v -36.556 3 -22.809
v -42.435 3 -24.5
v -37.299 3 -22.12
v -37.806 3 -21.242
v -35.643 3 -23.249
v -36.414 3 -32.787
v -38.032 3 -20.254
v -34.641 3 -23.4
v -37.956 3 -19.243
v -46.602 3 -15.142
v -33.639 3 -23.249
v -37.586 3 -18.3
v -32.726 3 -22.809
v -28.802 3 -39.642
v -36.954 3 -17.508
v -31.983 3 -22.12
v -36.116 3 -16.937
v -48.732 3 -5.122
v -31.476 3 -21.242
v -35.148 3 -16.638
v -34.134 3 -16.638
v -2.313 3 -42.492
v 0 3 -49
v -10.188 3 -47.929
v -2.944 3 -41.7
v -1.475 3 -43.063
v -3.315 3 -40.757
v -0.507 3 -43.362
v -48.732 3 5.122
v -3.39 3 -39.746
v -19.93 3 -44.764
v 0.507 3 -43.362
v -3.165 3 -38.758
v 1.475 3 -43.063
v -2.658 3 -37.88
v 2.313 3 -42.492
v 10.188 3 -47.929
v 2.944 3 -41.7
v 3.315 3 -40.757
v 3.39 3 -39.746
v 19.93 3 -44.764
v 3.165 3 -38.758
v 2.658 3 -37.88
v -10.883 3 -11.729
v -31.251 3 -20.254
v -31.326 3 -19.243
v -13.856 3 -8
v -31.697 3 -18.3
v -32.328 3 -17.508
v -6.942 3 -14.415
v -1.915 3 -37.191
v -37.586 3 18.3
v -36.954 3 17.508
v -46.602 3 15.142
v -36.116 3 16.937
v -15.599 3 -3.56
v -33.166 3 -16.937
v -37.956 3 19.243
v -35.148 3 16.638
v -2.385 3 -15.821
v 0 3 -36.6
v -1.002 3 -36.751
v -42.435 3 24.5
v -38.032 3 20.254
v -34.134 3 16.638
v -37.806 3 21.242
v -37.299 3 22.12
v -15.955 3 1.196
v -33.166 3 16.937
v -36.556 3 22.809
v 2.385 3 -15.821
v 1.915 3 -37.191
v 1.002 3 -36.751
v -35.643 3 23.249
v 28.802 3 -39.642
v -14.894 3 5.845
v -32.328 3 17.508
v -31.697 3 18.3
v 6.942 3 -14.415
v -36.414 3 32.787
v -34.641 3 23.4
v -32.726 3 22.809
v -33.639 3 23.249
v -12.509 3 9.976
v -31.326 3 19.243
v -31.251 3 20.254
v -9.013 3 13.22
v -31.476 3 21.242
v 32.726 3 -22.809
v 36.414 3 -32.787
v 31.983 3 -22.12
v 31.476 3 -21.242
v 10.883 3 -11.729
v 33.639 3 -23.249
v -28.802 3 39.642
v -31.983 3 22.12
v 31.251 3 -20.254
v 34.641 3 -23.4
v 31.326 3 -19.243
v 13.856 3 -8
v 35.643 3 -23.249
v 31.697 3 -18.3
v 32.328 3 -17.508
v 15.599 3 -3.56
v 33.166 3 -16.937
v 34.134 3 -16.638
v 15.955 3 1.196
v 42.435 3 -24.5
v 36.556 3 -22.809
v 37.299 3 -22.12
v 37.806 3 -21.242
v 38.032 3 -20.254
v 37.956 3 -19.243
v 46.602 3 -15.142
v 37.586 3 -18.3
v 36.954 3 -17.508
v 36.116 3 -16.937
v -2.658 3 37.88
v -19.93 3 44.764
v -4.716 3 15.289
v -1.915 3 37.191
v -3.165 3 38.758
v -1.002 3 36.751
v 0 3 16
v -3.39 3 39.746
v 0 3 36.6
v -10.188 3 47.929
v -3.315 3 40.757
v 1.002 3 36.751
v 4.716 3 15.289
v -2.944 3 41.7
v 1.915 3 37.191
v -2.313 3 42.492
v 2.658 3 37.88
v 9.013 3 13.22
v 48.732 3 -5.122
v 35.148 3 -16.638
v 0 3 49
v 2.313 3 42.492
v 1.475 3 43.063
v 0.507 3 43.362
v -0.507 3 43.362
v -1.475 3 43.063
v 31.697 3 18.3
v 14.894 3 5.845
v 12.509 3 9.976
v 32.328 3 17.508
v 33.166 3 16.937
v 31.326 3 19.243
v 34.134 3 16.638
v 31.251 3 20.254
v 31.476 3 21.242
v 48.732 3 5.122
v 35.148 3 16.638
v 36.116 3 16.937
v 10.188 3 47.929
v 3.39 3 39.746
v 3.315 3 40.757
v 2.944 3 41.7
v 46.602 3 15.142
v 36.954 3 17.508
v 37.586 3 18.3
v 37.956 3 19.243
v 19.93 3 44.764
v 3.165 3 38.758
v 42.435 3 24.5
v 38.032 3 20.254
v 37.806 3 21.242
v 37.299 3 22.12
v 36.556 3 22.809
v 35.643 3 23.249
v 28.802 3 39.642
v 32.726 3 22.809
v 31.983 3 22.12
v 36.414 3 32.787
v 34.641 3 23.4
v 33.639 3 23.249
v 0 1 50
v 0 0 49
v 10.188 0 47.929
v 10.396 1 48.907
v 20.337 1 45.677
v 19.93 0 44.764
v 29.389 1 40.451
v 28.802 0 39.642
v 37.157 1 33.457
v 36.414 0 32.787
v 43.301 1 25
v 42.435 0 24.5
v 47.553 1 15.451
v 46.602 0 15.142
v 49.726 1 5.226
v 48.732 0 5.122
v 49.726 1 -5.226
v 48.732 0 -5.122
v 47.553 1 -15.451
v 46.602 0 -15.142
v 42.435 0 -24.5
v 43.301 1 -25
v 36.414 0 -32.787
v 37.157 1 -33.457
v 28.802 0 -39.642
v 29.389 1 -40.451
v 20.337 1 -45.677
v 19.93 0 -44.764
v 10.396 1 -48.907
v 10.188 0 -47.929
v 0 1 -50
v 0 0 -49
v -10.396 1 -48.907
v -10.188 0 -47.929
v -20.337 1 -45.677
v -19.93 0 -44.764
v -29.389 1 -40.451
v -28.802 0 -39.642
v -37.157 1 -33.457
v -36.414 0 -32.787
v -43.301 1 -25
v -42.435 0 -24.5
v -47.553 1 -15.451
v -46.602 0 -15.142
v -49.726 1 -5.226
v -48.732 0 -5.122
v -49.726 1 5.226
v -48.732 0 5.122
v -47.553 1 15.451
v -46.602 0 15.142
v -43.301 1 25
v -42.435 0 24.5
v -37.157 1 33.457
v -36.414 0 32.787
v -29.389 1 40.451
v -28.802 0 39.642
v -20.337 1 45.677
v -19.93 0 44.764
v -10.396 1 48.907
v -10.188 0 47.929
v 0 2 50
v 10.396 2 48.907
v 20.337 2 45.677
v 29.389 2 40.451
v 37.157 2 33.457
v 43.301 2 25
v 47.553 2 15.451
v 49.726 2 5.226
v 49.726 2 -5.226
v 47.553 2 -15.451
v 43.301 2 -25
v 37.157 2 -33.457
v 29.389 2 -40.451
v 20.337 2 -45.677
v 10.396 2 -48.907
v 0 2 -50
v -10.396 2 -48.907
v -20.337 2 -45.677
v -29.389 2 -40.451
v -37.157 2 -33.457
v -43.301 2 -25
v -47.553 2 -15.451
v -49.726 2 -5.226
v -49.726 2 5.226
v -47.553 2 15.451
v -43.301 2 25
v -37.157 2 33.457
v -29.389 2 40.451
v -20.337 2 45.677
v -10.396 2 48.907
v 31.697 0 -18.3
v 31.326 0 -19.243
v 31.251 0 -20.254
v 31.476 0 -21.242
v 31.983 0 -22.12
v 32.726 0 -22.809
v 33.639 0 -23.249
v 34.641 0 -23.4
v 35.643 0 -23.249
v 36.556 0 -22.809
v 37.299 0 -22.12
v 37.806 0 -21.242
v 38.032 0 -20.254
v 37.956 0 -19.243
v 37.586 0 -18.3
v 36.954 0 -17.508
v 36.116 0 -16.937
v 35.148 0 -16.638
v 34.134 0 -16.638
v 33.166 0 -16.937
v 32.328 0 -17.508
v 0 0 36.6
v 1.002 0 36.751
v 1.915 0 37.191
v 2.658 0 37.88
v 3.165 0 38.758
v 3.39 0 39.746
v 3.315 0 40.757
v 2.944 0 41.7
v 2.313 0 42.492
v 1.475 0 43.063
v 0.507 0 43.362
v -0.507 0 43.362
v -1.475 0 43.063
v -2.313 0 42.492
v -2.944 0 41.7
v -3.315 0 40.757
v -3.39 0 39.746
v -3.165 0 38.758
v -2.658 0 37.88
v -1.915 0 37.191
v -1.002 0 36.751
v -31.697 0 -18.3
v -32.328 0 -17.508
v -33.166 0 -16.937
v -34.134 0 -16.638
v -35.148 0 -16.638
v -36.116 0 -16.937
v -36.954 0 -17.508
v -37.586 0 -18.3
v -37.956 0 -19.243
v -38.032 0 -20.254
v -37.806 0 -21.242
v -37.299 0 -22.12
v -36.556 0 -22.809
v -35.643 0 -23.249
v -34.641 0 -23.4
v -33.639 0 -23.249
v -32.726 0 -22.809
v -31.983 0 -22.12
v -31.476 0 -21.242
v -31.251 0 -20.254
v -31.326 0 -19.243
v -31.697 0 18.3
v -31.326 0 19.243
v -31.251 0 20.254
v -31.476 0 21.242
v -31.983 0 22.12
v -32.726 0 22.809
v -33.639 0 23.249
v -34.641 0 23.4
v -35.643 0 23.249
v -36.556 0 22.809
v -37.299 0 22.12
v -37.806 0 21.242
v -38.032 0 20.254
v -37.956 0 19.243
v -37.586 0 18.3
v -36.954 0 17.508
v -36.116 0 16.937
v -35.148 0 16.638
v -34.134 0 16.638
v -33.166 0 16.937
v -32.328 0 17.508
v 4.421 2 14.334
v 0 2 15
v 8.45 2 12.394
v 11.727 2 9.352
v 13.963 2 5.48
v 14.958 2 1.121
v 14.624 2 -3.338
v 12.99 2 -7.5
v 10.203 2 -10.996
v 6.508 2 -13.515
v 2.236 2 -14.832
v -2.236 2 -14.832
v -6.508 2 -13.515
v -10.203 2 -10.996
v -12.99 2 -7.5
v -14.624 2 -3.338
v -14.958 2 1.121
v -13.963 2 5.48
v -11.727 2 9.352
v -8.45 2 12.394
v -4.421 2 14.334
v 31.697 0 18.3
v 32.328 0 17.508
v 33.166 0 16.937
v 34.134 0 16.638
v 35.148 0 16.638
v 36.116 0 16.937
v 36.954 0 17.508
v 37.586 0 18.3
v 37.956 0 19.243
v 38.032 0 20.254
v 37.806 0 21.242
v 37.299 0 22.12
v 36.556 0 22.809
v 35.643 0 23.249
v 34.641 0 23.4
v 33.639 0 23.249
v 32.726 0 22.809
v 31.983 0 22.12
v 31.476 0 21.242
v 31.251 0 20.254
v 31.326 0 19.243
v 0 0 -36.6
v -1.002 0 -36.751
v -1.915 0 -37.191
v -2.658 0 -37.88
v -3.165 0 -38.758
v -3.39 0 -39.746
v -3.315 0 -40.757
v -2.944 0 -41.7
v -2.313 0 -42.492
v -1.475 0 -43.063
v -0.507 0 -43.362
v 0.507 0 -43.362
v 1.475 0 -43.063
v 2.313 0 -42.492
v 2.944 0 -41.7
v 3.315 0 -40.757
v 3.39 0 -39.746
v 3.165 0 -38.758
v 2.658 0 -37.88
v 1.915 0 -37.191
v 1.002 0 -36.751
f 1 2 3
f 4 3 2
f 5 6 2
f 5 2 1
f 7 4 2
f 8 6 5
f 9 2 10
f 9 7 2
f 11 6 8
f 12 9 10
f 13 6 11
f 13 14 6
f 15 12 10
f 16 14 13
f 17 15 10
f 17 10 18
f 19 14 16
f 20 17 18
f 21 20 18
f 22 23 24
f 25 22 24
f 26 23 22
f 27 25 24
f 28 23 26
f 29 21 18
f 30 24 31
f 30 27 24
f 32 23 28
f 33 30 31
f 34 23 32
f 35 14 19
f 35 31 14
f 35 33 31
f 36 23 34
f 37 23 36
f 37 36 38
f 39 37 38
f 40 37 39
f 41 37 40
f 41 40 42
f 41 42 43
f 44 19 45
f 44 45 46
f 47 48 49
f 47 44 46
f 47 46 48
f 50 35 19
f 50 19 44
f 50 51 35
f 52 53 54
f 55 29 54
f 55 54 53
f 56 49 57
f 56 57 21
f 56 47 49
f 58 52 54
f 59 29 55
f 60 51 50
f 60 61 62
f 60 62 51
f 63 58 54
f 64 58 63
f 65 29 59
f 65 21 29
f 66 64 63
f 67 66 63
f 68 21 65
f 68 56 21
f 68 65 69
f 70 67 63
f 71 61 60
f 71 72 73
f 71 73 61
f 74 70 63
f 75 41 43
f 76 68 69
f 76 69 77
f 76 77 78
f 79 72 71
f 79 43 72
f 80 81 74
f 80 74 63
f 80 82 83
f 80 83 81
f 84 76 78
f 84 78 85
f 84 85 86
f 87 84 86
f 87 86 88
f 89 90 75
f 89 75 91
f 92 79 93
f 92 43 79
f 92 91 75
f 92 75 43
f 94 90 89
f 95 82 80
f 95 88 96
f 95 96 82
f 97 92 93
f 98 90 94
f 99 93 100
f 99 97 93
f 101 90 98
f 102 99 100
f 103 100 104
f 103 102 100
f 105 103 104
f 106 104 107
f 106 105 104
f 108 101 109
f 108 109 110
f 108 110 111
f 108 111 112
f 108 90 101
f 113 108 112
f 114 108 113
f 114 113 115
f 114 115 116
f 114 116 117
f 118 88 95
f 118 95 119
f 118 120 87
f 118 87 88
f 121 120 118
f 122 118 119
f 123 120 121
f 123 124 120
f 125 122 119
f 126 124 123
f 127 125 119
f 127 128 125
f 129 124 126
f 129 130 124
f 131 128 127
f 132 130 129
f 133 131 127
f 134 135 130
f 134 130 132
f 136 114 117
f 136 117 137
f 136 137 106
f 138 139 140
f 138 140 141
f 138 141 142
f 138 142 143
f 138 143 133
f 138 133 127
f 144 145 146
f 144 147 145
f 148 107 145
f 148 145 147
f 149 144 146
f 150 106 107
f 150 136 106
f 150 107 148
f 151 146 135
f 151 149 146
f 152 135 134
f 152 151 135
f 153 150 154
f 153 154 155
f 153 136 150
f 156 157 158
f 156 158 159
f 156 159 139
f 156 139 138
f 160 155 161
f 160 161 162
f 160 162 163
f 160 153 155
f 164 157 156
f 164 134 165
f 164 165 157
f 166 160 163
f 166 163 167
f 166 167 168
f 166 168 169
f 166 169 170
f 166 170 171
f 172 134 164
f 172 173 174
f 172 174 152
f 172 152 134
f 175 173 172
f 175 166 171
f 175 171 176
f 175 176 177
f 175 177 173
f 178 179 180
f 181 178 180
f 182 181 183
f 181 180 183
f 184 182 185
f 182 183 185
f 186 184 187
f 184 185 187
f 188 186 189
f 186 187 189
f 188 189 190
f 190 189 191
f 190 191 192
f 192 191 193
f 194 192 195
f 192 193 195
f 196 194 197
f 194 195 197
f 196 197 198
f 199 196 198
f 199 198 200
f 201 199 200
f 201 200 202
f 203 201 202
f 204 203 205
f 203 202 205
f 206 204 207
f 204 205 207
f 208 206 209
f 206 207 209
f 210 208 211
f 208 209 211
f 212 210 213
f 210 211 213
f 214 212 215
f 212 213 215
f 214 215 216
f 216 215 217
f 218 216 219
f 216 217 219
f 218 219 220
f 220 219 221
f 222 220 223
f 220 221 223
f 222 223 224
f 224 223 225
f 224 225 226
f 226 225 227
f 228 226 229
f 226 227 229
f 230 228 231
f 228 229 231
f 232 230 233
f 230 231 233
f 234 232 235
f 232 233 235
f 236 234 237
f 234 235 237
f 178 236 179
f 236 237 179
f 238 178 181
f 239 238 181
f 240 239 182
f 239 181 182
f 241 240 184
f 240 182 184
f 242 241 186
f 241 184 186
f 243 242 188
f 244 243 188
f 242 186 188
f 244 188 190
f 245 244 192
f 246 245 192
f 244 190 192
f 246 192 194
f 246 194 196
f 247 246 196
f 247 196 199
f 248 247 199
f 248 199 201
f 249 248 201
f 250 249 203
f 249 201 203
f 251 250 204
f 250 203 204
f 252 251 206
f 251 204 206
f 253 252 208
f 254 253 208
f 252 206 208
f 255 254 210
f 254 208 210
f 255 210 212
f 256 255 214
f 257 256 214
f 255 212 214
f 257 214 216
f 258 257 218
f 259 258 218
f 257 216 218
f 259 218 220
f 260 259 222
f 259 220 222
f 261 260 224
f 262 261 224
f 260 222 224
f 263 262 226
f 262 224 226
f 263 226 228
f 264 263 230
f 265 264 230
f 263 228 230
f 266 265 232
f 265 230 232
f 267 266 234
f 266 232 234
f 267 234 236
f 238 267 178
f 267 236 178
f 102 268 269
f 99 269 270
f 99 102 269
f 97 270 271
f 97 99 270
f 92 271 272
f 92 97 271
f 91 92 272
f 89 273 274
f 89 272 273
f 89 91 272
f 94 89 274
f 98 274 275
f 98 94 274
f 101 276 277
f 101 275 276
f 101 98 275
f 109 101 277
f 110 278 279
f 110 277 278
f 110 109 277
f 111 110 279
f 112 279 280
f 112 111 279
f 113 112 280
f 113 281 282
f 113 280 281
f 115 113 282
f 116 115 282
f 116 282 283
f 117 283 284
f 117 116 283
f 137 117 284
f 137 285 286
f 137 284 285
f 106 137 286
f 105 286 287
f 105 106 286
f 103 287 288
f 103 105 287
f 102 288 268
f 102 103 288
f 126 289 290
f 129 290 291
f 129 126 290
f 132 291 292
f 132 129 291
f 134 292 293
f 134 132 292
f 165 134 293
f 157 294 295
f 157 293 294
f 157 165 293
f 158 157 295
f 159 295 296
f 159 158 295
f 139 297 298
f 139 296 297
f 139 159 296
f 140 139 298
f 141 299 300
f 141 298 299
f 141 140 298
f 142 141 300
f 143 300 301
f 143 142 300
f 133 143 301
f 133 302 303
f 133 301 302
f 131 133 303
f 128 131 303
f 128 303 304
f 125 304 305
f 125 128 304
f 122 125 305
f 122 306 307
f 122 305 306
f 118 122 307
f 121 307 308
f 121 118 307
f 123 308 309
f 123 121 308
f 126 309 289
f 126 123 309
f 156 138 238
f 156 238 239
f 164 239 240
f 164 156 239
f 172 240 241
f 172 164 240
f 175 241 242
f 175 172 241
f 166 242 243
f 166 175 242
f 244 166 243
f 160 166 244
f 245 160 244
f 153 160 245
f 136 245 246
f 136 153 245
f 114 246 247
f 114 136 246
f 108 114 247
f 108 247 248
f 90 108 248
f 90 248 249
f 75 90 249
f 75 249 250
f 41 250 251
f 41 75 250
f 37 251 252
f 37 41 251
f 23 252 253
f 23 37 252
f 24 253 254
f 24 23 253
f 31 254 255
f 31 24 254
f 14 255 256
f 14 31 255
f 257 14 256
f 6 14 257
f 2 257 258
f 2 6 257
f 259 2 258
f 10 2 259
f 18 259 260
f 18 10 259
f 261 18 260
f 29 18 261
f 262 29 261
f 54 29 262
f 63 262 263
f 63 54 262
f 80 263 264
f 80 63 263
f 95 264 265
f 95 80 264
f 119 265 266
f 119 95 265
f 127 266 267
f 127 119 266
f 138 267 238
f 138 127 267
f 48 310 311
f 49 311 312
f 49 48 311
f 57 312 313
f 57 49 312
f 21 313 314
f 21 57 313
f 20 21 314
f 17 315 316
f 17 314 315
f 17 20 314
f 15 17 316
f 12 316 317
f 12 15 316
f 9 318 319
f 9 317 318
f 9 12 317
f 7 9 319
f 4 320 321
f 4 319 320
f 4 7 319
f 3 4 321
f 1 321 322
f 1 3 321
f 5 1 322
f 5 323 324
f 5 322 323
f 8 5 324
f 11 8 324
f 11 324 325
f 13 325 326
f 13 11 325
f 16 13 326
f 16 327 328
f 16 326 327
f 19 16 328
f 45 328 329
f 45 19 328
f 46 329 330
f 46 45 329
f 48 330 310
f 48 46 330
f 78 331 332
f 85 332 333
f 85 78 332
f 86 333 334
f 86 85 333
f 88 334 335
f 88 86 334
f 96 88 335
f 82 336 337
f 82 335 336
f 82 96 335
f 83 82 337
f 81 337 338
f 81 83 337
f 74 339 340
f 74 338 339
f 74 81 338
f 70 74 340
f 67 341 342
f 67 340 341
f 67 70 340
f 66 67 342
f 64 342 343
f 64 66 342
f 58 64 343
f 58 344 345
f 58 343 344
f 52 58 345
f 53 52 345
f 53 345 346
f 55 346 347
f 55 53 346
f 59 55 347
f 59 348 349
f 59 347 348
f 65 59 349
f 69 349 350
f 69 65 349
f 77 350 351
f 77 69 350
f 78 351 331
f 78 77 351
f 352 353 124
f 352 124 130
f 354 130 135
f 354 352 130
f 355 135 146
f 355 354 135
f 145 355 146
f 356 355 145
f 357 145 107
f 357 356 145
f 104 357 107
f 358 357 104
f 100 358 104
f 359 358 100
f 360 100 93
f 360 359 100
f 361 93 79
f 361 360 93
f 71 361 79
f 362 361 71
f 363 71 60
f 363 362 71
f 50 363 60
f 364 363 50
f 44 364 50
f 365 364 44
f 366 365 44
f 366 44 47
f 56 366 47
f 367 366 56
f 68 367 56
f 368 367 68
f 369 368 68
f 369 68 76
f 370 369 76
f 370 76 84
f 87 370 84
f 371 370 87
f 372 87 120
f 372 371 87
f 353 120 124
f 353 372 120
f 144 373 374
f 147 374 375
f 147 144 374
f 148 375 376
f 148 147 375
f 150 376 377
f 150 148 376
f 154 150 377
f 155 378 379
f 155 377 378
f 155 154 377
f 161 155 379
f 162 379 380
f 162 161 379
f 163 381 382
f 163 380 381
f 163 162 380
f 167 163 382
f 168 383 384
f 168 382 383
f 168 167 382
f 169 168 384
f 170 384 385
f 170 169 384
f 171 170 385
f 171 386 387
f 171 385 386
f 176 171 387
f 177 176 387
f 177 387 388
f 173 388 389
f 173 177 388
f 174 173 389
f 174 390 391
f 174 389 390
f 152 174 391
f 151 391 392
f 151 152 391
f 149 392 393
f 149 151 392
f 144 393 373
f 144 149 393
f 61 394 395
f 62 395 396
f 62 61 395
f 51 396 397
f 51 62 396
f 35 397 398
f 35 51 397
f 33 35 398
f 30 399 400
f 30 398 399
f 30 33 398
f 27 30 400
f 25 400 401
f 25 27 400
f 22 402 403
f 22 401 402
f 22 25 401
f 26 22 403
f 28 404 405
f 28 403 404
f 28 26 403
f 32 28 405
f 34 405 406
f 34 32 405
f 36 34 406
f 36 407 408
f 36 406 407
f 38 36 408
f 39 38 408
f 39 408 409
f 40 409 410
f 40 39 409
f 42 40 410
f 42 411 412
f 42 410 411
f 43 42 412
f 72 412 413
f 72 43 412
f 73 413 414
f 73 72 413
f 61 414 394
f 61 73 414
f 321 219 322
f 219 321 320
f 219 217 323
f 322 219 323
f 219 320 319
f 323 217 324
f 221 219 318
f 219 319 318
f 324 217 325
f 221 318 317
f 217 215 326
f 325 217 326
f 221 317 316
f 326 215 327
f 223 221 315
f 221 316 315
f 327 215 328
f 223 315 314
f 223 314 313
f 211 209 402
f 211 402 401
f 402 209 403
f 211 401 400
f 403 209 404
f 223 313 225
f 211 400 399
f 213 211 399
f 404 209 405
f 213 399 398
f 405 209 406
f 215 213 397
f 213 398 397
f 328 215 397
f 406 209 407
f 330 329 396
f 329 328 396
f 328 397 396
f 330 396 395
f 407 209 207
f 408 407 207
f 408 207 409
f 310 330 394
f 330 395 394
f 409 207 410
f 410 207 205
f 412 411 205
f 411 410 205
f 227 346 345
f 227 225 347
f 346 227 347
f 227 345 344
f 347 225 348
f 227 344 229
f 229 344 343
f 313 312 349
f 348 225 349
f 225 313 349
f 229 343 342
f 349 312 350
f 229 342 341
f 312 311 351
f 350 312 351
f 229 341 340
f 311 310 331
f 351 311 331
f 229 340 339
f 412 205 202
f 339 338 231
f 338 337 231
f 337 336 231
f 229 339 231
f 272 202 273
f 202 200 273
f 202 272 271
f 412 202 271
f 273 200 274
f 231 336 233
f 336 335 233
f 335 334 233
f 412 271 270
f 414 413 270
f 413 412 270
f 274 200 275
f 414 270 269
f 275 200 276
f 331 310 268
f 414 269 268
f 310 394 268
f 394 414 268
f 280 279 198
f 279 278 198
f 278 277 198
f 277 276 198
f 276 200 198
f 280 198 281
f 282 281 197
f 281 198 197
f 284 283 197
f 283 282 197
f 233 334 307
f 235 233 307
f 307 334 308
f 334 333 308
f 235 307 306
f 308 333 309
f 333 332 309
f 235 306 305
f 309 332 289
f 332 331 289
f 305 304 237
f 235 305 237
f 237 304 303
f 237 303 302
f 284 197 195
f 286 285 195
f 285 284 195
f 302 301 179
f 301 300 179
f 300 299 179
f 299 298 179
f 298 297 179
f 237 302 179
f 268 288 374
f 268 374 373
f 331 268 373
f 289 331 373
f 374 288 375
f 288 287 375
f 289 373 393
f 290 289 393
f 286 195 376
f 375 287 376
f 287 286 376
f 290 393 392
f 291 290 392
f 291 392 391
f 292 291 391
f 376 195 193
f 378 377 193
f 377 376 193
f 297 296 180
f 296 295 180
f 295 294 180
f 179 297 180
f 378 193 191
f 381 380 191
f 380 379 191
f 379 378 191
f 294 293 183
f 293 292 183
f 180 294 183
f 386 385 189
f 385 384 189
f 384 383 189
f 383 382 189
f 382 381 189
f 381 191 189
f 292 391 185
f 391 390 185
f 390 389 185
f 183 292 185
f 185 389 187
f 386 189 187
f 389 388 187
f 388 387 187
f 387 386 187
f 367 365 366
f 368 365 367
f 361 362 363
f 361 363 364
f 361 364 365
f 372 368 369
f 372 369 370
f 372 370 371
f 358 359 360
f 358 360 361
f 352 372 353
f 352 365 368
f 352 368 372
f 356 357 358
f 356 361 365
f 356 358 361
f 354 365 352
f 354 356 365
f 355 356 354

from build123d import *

# Parameters (mm, degrees)
SKETCH_1_R               = 50
EXTRUDE_1_DEPTH          = 3
PATTERN_CIRCULAR_1_COUNT = 6
SKETCH_5_R               = 15
CUT_EXTRUDE_1_DEPTH      = 1
CHAMFER_1_SIZE           = 1


with BuildPart() as part:
    # 草图1 → 凸台-拉伸1 (new body)
    with BuildSketch(Plane(origin=(0, 0, 0), x_dir=(1, 0, 0), z_dir=(0, 1, 0))):
        with Locations(Location((0, 0, 0), (0, 0, 270))):
            Circle(SKETCH_1_R)
    extrude(amount=EXTRUDE_1_DEPTH)

    # 草图4 → M8 螺纹孔的螺纹孔钻头1 (revolve, cut)
    with BuildSketch(Plane(origin=(0, 3, -40), x_dir=(0, 0, 1), z_dir=(1, 0, 0))):
        Polygon((0, 0), (0, 18.042926105), (3.4, 16), (3.4, 0), align=None)
    hole_wizard_m8_1 = revolve(axis=Axis((0, 9.35, -40), (0, -1, 0)), mode=Mode.SUBTRACT)

    # 阵列(圆周)1: M8 螺纹孔的螺纹孔钻头1 ×6 about axis
    pattern_circular_1_axis = Axis((0, 0, 0), (0, 1, 0))
    for i in range(1, PATTERN_CIRCULAR_1_COUNT):
        add(hole_wizard_m8_1.rotate(pattern_circular_1_axis, i * 360 / PATTERN_CIRCULAR_1_COUNT), mode=Mode.SUBTRACT)

    # 草图5 → 切除-拉伸1 (cut)
    with BuildSketch(Plane(origin=(0, 3, 0), x_dir=(1, 0, 0), z_dir=(0, 1, 0))):
        with Locations(Location((0, 0, 0), (0, 0, 270))):
            Circle(SKETCH_5_R)
    extrude(amount=-CUT_EXTRUDE_1_DEPTH, mode=Mode.SUBTRACT)

    # 倒角1
    chamfer_1_edges = [part.edges().sort_by_distance(p)[0] for p in [
        (0, 0, -50),
        (0, 3, -15),
        (0, 3, -50),
    ]]
    chamfer(chamfer_1_edges, length=CHAMFER_1_SIZE - 0.0001)  # a hair under: the kernel refuses the full size


solid = part.part
